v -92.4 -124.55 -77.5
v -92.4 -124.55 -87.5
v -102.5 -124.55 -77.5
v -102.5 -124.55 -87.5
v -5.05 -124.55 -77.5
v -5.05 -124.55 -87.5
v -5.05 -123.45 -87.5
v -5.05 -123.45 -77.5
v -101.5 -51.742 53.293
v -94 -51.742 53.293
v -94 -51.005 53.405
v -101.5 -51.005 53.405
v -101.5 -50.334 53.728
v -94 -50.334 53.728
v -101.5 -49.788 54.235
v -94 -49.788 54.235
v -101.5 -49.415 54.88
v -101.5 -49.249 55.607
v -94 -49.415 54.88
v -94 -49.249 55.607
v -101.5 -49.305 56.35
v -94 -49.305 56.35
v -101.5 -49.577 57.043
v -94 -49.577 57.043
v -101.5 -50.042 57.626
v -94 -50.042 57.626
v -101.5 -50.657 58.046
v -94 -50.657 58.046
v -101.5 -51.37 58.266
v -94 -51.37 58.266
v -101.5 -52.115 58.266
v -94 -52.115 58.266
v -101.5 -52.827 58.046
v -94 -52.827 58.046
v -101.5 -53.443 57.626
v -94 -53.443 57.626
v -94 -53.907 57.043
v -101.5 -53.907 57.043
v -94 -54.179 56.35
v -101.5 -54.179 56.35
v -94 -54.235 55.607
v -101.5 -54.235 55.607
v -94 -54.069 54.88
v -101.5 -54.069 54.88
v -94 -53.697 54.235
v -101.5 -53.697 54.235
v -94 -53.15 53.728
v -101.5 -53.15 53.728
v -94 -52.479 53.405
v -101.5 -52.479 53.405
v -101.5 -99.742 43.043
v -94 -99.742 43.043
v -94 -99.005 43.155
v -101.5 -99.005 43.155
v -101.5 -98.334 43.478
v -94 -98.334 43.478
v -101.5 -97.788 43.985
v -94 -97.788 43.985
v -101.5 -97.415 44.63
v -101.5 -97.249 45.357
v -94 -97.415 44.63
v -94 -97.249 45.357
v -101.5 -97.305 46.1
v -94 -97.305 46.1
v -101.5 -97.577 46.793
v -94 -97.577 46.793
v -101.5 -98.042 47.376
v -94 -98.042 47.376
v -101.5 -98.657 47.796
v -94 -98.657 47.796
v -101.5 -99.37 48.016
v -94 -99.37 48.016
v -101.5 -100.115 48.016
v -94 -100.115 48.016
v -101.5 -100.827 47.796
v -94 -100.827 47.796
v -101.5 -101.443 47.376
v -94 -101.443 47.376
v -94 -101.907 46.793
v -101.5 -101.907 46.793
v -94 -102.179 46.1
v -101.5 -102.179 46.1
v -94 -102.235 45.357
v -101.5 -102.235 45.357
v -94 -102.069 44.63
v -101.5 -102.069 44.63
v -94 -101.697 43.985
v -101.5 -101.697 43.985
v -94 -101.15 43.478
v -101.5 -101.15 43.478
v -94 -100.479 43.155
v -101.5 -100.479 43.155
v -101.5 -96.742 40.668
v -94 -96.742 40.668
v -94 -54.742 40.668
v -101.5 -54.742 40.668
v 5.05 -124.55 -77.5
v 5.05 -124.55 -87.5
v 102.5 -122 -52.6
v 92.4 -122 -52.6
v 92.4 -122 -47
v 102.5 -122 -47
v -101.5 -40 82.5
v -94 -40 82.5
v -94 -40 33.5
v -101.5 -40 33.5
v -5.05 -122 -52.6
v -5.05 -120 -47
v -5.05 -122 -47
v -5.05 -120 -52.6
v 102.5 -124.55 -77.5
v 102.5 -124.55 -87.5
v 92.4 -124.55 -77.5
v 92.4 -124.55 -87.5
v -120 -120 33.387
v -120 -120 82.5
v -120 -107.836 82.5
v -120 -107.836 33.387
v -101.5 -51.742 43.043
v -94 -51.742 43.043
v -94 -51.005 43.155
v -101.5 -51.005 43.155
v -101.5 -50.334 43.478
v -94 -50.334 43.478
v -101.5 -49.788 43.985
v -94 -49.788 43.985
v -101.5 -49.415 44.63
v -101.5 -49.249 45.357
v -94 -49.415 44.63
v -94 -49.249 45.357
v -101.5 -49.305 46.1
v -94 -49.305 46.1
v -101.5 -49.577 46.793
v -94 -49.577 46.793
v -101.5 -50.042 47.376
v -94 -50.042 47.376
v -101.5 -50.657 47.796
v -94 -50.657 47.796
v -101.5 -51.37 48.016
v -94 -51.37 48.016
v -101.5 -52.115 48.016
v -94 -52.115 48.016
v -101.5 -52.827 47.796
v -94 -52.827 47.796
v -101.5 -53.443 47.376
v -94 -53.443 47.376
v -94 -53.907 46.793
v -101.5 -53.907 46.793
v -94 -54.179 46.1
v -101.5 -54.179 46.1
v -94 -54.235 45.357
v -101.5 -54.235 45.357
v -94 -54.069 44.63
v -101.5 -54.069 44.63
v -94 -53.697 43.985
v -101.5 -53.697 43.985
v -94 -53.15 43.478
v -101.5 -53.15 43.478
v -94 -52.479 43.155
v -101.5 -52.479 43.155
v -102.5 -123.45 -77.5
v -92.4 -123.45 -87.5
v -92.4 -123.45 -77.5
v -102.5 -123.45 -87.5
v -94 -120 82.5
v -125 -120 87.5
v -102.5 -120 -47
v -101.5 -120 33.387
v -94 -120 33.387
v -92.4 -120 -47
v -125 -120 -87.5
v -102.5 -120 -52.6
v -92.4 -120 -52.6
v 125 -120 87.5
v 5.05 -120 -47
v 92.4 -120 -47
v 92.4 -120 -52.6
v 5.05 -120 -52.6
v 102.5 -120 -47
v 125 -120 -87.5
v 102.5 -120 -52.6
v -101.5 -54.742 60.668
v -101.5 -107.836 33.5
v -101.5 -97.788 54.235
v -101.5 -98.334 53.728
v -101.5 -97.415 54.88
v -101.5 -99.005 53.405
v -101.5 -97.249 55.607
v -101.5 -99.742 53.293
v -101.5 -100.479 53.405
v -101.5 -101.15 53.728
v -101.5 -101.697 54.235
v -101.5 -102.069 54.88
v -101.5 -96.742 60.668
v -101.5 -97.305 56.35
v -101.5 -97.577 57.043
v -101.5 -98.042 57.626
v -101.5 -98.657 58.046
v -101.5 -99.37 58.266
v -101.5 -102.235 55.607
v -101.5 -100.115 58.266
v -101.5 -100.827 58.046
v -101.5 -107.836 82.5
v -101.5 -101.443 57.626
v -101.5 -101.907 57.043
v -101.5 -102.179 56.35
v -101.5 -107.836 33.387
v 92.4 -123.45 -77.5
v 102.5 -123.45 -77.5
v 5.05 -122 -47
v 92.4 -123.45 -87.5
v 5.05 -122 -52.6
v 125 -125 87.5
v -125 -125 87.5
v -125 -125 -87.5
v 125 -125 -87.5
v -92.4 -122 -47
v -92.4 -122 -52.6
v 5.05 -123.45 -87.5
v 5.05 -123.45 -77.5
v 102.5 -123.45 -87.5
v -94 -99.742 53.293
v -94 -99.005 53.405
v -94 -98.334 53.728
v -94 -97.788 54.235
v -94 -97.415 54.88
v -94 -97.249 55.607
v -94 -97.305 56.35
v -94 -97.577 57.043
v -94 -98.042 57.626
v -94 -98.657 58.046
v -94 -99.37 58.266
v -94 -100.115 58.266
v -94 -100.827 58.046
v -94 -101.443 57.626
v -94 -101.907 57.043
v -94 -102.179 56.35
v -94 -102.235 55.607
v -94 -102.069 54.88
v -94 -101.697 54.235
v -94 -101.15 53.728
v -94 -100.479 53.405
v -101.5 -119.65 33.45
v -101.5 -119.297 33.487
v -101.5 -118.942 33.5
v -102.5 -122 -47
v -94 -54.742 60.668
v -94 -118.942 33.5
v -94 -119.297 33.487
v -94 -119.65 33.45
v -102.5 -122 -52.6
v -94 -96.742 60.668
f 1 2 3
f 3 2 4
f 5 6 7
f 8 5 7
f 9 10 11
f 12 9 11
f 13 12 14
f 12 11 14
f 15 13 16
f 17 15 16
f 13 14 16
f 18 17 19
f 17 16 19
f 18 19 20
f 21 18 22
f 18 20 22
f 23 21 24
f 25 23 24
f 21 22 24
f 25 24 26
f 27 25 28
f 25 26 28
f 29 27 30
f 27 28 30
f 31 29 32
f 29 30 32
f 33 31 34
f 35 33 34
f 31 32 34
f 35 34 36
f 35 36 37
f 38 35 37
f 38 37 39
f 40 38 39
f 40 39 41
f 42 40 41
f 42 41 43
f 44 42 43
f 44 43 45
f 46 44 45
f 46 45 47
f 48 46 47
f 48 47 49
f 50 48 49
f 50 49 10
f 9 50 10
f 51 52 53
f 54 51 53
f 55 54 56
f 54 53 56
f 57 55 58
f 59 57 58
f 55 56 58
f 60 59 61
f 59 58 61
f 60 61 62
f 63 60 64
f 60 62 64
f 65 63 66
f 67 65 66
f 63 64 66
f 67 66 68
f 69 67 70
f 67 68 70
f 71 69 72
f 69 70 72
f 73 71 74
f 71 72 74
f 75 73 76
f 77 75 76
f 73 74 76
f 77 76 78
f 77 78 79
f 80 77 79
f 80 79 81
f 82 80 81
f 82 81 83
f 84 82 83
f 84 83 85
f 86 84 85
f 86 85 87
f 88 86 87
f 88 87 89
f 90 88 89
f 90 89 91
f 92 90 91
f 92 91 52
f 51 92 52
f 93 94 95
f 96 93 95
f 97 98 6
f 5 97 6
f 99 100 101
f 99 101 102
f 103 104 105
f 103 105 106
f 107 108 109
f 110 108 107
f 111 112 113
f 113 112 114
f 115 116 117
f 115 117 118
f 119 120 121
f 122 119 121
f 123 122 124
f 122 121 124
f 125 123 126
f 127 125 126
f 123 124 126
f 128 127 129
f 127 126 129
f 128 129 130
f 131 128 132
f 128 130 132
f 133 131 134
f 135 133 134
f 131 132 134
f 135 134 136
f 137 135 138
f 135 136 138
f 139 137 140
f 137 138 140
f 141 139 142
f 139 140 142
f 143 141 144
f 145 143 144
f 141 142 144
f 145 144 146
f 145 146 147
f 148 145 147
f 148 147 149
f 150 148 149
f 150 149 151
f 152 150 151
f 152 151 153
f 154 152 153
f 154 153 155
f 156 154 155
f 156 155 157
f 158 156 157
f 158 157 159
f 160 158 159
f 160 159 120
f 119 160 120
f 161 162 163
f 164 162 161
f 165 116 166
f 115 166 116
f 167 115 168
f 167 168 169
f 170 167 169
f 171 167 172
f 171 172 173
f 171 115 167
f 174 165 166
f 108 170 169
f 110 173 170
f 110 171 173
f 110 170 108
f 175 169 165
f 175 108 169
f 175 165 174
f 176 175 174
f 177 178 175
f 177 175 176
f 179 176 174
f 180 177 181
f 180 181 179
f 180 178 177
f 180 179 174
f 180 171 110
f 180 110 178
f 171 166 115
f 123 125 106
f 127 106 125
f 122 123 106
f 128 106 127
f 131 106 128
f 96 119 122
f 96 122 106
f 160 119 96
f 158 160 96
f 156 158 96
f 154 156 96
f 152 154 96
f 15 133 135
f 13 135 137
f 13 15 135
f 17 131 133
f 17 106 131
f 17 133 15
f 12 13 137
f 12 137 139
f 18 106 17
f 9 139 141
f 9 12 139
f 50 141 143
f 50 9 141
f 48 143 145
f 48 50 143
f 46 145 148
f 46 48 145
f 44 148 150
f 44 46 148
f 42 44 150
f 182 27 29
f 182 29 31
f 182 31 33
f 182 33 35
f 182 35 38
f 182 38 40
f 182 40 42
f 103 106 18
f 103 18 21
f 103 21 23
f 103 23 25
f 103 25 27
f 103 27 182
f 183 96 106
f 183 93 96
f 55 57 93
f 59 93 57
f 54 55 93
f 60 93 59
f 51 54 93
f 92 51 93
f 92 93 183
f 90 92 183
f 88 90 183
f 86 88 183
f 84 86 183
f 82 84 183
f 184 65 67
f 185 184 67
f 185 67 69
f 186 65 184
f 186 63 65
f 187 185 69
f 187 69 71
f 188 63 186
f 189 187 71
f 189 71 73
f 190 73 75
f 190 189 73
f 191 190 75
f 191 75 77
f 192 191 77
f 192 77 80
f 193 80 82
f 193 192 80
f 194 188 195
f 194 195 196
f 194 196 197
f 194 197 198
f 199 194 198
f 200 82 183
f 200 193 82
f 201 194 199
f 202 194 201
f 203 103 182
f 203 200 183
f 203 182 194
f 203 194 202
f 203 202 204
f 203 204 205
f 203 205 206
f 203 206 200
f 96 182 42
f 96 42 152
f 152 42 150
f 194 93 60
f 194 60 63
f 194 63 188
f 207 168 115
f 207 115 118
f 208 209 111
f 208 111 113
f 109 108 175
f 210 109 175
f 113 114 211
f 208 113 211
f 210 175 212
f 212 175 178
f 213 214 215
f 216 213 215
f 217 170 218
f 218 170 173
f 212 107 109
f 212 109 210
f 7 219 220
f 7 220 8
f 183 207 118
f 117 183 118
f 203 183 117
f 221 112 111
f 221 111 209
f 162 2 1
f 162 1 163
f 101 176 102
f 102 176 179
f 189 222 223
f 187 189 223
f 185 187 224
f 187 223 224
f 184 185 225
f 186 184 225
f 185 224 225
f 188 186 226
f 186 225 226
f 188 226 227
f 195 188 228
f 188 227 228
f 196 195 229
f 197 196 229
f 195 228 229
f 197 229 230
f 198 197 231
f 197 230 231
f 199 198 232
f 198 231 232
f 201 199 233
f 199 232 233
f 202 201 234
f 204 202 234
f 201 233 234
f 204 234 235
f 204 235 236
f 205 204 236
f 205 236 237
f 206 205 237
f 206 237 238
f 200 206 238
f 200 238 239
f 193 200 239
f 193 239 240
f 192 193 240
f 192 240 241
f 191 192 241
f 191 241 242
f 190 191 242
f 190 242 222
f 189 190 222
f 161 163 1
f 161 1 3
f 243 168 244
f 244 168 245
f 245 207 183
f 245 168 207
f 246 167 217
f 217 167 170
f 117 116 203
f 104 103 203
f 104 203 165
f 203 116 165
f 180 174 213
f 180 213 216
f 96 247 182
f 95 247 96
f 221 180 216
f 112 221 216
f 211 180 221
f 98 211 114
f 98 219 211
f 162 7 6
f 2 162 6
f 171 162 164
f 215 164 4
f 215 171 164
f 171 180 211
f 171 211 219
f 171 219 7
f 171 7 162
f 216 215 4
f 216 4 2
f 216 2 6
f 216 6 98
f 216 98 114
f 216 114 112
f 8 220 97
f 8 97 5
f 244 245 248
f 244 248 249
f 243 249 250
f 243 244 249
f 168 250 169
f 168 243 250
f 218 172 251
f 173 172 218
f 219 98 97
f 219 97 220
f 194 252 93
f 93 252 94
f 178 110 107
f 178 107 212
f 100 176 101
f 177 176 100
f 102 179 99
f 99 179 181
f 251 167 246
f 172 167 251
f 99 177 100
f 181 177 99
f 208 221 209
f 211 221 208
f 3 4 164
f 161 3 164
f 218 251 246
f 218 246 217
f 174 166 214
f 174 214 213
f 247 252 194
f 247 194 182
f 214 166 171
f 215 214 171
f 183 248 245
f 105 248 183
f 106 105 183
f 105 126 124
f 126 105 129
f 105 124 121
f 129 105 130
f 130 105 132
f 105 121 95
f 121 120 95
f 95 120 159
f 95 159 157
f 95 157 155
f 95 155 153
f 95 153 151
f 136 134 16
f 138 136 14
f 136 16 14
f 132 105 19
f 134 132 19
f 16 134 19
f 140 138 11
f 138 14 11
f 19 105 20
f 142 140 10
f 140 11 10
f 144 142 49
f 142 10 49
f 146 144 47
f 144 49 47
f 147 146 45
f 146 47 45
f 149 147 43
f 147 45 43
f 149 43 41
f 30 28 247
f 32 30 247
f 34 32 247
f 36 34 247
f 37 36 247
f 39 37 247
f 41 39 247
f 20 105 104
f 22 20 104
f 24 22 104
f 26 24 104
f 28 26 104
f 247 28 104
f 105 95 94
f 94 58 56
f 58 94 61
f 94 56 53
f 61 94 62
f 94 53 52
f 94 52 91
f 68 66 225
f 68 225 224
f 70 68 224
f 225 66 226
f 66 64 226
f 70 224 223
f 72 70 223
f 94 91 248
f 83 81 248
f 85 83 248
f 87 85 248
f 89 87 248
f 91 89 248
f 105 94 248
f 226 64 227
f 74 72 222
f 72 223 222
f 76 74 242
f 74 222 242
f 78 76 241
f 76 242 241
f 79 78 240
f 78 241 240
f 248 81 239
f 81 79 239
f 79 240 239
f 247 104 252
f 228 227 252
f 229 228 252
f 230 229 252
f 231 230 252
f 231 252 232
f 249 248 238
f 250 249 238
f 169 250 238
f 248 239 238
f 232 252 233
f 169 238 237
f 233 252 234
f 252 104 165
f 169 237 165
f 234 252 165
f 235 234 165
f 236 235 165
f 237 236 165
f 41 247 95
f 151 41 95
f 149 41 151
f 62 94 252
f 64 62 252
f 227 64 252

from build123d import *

# Parameters (mm, degrees)
SKETCH1_W               = 250
SKETCH1_H               = 175
BOSS_EXTRUDE1_DEPTH     = 125
SKETCH2_W               = 240
SKETCH2_H               = 165
CUT_EXTRUDE1_DEPTH      = 120
SKETCH3_W               = 40.1
SKETCH3_H               = 165
CUT_EXTRUDE2_DEPTH      = 198.246672976
SKETCH6_W               = 250
SKETCH6_H               = 175
BOSS_EXTRUDE2_DEPTH     = 5
SKETCH7_W               = 205
SKETCH7_H               = 30
PIANO_PLUG_DEPTH        = 5
ARM_HOLE_REACH          = 199.247
SKETCH8_W               = 50
SKETCH8_H               = 180
BOSS_EXTRUDE8_REACH     = 216.001
SKETCH4_R               = 6
MAIN_SHAFT_HOLE_DEPTH   = 293.884362846
CUT_EXTRUDE8_DEPTH      = 16
CUT_EXTRUDE8_DEPTH_BACK = 33
SKETCH10_R              = 20
BOTTOM_OPEN_DEPTH       = 28
BOTTOM_OPEN_DEPTH_BACK  = 21
SKETCH11_W              = 230
SKETCH11_H              = 155
SKETCH12_W              = 41.033462292
SKETCH12_H              = 5
BOSS_EXTRUDE4_DEPTH     = 233
SKETCH13_W              = 7.5
SKETCH13_H              = 80
BOSS_EXTRUDE5_DEPTH     = 49
SKETCH14_W              = 44.113211518
SKETCH14_H              = 5
BOSS_EXTRUDE6_DEPTH     = 21
FILLET2_R               = 5
SKETCH16_R              = 2.5
SKETCH16_W              = 20
SKETCH16_H              = 42
SERVO_PLUG_HOLE_DEPTH   = 106
SKETCH17_W              = 49.113211518
SKETCH17_H              = 12.164138601
BOSS_EXTRUDE7_DEPTH     = 23
SKETCH19_W              = 10.1
SKETCH19_H              = 5.6
CUT_EXTRUDE9_DEPTH      = 2
SKETCH21_W              = 10.1
SKETCH21_H              = 1.1
CUT_EXTRUDE10_DEPTH     = 10
SKETCH23_W              = 230
SKETCH23_H              = 113.966537708
MAKE_IT_PANEL1_DEPTH    = 5
SKETCH22_W              = 250
SKETCH22_H              = 175
SKETCH22_W_2            = 240
SKETCH22_H_2            = 165
MAKE_IT_PANEL3_DEPTH    = 120
SKETCH24_W              = 240
SKETCH24_H              = 165
CUT_EXTRUDE11_DEPTH     = 5


with BuildPart() as part:
    # Sketch1 → Boss-Extrude1 (new body)
    with BuildSketch(Plane(origin=(0, 0, 0), x_dir=(1, 0, 0), z_dir=(0, 1, 0))):
        Rectangle(SKETCH1_W, SKETCH1_H)
    extrude(amount=-BOSS_EXTRUDE1_DEPTH)

    # Sketch2 → Cut-Extrude1 (cut)
    with BuildSketch(Plane.XZ.offset(125)):
        Rectangle(SKETCH2_W, SKETCH2_H)
    extrude(amount=-CUT_EXTRUDE1_DEPTH, mode=Mode.SUBTRACT)

    # Sketch3 → Cut-Extrude2 (cut, through all)
    with BuildSketch(Plane(origin=(0, 0, 0), x_dir=(1, 0, 0), z_dir=(0, 1, 0))):
        Rectangle(SKETCH3_W, SKETCH3_H)
    extrude(amount=-CUT_EXTRUDE2_DEPTH, mode=Mode.SUBTRACT)

    # Sketch6 → Boss-Extrude2 (add)
    with BuildSketch(Plane.XZ.offset(125)):
        Rectangle(SKETCH6_W, SKETCH6_H)
    extrude(amount=-BOSS_EXTRUDE2_DEPTH)

    # Sketch7 → Piano Plug (cut)
    with BuildSketch(Plane(origin=(0, 0, -87.5), x_dir=(-1, 0, 0), z_dir=(0, 0, -1))):
        with Locations((0, -105)):
            Rectangle(SKETCH7_W, SKETCH7_H)
    extrude(amount=-PIANO_PLUG_DEPTH, mode=Mode.SUBTRACT)

    # Arm Hole: up to this face of the body (flat: up to its plane)
    arm_hole_end = Plane(part.part.faces().sort_by_distance((0, -120, -2.144615385))[0])
    # Sketch8 → Arm Hole (cut, up to the picked face)
    with BuildSketch(Plane(origin=(0, 0, 0), x_dir=(1, 0, 0), z_dir=(0, 1, 0)), mode=Mode.PRIVATE) as arm_hole_sk1:
        with Locations((-0.05, -2.5)):
            Rectangle(SKETCH8_W, SKETCH8_H)
    arm_hole_tool1 = split(extrude(arm_hole_sk1.sketch, amount=-ARM_HOLE_REACH, mode=Mode.PRIVATE), bisect_by=arm_hole_end, keep=Keep.BOTH, mode=Mode.PRIVATE)
    add(arm_hole_tool1.solids().sort_by(Axis((-0.05, 0, 2.5), (0, -1, 0)))[0], mode=Mode.SUBTRACT)

    # Sketch9 → Boss-Extrude8 (add, up to next)
    with BuildSketch(Plane(origin=(-25.05, 0, 0), x_dir=(0, 0, -1), z_dir=(1, 0, 0)), mode=Mode.PRIVATE) as boss_extrude8_sk1:
        Polygon((87.5, 0), (87.5, -90), (82.5, -90), (82.5, -5), (0, -5), (0, 0), align=None)
    boss_extrude8_tool1 = extrude(boss_extrude8_sk1.sketch, amount=BOSS_EXTRUDE8_REACH, mode=Mode.PRIVATE) - part.part
    add(boss_extrude8_tool1.solids().sort_by_distance((-25.05, -45, -86.244761))[0])

    # Sketch4 → Main Shaft Hole (cut, through all)
    with BuildSketch(Plane.ZY.offset(125)):
        with Locations((0, -62.5)):
            Circle(SKETCH4_R)
    extrude(amount=-MAIN_SHAFT_HOLE_DEPTH, mode=Mode.SUBTRACT)

    # Sketch10 → Cut-Extrude8 (cut, two sides: drawn at the far end of the back side and taken through both)
    with BuildSketch(Plane.ZY.offset(125).offset(-CUT_EXTRUDE8_DEPTH_BACK)):
        with Locations((50.8, -62.5)):
            Circle(SKETCH10_R)
    extrude(amount=CUT_EXTRUDE8_DEPTH + CUT_EXTRUDE8_DEPTH_BACK, mode=Mode.SUBTRACT)

    # Sketch11 → Bottom Open (cut, two sides: drawn at the far end of the back side and taken through both)
    with BuildSketch(Plane(origin=(0, -125, 0), x_dir=(-1, 0, 0), z_dir=(0, -1, 0)).offset(-BOTTOM_OPEN_DEPTH_BACK)):
        Rectangle(SKETCH11_W, SKETCH11_H)
    extrude(amount=BOTTOM_OPEN_DEPTH + BOTTOM_OPEN_DEPTH_BACK, mode=Mode.SUBTRACT)

    # Sketch12 → Boss-Extrude4 (add)
    with BuildSketch(Plane(origin=(-115, 0, 0), x_dir=(0, 0, -1), z_dir=(1, 0, 0))):
        with Locations((56.983268854, -122.5)):
            Rectangle(SKETCH12_W, SKETCH12_H)
    extrude(amount=BOSS_EXTRUDE4_DEPTH)

    # Sketch13 → Boss-Extrude5 (add)
    with BuildSketch(Plane(origin=(0, 0, 82.5), x_dir=(-1, 0, 0), z_dir=(0, 0, -1))):
        with Locations((97.75, -80)):
            Rectangle(SKETCH13_W, SKETCH13_H)
    extrude(amount=BOSS_EXTRUDE5_DEPTH)

    # Sketch14 → Boss-Extrude6 (add)
    with BuildSketch(Plane(origin=(-115, 0, 0), x_dir=(0, 0, -1), z_dir=(1, 0, 0))):
        with Locations((-55.443394241, -122.5)):
            Rectangle(SKETCH14_W, SKETCH14_H)
    extrude(amount=BOSS_EXTRUDE6_DEPTH)

    # Fillet2
    # the kernel refuses this fillet: 5 mm, written as the material it adds along each edge
    with BuildSketch(Plane(origin=(-101.5, -120, 33.5), x_dir=(0, 1, 0), z_dir=(1, 0, 0))) as fillet2_piece_1:
        with BuildLine():
            CenterArc((1.057968965, -5), FILLET2_R, 90, 12.215768954)
            Line((0, -0.113211518), (-0.021159379, -0.015475748))
            ThreePointArc((-0.021159379, -0.015475748), (-0.1, -0.056605759), (-0.1, 0))
            Line((-0.1, 0), (0, 0.1))
            Line((0, 0.1), (1.057968965, 0.1))
            Line((1.057968965, 0.1), (1.057968965, 0))
        make_face()
    extrude(amount=7.5)

    # Sketch16 → Servo Plug Hole (cut)
    with BuildSketch(Plane(origin=(0, 0, 0), x_dir=(0, 0, -1), z_dir=(1, 0, 0))):
        with Locations((-45.543439041, -51.74216133)):
            Circle(SKETCH16_R)
        with Locations((-55.793439041, -51.74216133)):
            Circle(SKETCH16_R)
        with Locations((-50.668439041, -75.74216133)):
            Rectangle(SKETCH16_W, SKETCH16_H)
        with Locations((-45.543439041, -99.74216133)):
            Circle(SKETCH16_R)
        with Locations((-55.793439041, -99.74216133)):
            Circle(SKETCH16_R)
    extrude(amount=-SERVO_PLUG_HOLE_DEPTH, mode=Mode.SUBTRACT)

    # Sketch17 → Boss-Extrude7 (add)
    with BuildSketch(Plane.ZY.offset(101.5)):
        with Locations((57.943394241, -113.9179307)):
            Rectangle(SKETCH17_W, SKETCH17_H)
    extrude(amount=BOSS_EXTRUDE7_DEPTH)

    # Sketch19 → Cut-Extrude9 (cut)
    with BuildSketch(Plane(origin=(0, -120, 0), x_dir=(1, 0, 0), z_dir=(0, 1, 0))):
        with Locations((97.45, 49.8)):
            Rectangle(SKETCH19_W, SKETCH19_H)
        with Locations((-97.45, 49.8)):
            Rectangle(SKETCH19_W, SKETCH19_H)
        with Locations((0, 49.8)):
            Rectangle(SKETCH19_W, SKETCH19_H)
    extrude(amount=-CUT_EXTRUDE9_DEPTH, mode=Mode.SUBTRACT)

    # Sketch21 → Cut-Extrude10 (cut)
    with BuildSketch(Plane(origin=(0, 0, -87.5), x_dir=(-1, 0, 0), z_dir=(0, 0, -1))):
        with Locations((-97.45, -124)):
            Rectangle(SKETCH21_W, SKETCH21_H)
        with Locations((97.45, -124)):
            Rectangle(SKETCH21_W, SKETCH21_H)
        with Locations((0, -124)):
            Rectangle(SKETCH21_W, SKETCH21_H)
    extrude(amount=-CUT_EXTRUDE10_DEPTH, mode=Mode.SUBTRACT)

    # Sketch23 → Make it Panel1 (add)
    with BuildSketch(Plane(origin=(0, -120, 0), x_dir=(1, 0, 0), z_dir=(0, 1, 0))):
        with Locations((0, -20.516731146)):
            Rectangle(SKETCH23_W, SKETCH23_H)
    extrude(amount=-MAKE_IT_PANEL1_DEPTH)

    # Sketch22 → Make it Panel3 (cut)
    with BuildSketch(Plane(origin=(0, -120, 0), x_dir=(1, 0, 0), z_dir=(0, 1, 0))):
        Rectangle(SKETCH22_W, SKETCH22_H)
        Rectangle(SKETCH22_W_2, SKETCH22_H_2, mode=Mode.SUBTRACT)
    extrude(amount=MAKE_IT_PANEL3_DEPTH, mode=Mode.SUBTRACT)


with BuildPart() as make_it_panel3_piece_1:
    # of the separate pieces the step leaves, piece 1, a body of its own (make_it_panel3_pieces)
    add(part.part.solids().sort_by_distance((-101.5, -118.942031035, 33.5))[0])


with BuildPart() as make_it_panel3_piece_2:
    # of the separate pieces the step leaves, piece 2, a body of its own (make_it_panel3_pieces)
    add(part.part.solids().sort_by_distance((-25.05, -5, 82.5))[0])

    # Sketch24 → Cut-Extrude11 (cut)
    with BuildSketch(Plane(origin=(0, 0, 0), x_dir=(1, 0, 0), z_dir=(0, 1, 0))):
        Rectangle(SKETCH24_W, SKETCH24_H)
    extrude(amount=-CUT_EXTRUDE11_DEPTH, mode=Mode.SUBTRACT)


solid = make_it_panel3_piece_1.part
